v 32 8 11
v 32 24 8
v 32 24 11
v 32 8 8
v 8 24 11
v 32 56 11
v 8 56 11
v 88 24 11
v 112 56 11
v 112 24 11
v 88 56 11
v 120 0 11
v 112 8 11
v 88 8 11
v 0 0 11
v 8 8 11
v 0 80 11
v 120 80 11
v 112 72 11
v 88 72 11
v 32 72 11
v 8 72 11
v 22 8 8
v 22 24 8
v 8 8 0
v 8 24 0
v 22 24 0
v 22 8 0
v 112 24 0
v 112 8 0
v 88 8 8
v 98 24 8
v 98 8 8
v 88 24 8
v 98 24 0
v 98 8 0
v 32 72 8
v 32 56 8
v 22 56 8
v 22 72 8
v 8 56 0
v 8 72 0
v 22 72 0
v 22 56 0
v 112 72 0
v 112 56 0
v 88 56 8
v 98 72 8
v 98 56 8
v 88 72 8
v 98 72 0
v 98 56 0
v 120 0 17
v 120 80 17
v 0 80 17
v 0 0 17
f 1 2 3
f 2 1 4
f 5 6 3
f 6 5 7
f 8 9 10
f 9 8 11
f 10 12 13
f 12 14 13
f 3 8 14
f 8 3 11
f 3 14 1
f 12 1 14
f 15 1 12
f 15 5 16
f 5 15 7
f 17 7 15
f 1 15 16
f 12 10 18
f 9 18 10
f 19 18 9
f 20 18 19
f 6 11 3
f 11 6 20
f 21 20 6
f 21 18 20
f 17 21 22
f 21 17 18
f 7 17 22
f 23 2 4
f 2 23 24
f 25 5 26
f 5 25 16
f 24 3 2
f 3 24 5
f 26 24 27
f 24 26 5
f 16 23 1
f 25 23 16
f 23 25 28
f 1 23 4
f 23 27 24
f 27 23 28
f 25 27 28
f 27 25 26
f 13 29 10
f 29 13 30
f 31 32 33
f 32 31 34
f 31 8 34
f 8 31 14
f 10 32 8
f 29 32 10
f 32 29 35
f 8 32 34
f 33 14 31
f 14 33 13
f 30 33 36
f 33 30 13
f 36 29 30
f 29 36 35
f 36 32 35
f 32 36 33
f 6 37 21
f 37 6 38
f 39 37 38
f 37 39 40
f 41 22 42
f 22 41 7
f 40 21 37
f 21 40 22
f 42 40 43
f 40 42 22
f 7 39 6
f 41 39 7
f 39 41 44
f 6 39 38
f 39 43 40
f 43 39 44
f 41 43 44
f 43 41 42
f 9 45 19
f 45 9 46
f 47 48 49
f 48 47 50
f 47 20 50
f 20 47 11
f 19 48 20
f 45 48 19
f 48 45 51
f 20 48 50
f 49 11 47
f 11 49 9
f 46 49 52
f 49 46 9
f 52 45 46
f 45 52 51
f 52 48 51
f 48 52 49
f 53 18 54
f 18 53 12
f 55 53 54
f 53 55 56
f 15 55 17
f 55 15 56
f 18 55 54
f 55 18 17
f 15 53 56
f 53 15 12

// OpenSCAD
// === Parameters ===

// Main slab dimensions
slab_width  = 120;   // X dimension of slab
slab_depth  = 80;    // Y dimension of slab
slab_height = 6;     // Z thickness of slab

// Shallow underside pad dimensions
pad_width   = 24;    // X dimension of each pad
pad_depth   = 16;    // Y dimension of each pad
pad_height  = 3;     // Z depth (shallow tier)

// Deep continuation dimensions (narrower, taller)
cont_width  = 14;    // X dimension (must be <= pad_width)
cont_height = 8;     // Z depth below the pad (deep tier)

// Pad inset from slab perimeter edges
inset_x = 8;         // distance from slab left/right edges to pad
inset_y = 8;         // distance from slab front/back edges to pad

// Resolution
$fn = 32;

// === Derived positions ===
// Stack order (bottom to top): deep cont -> shallow pad -> slab
// Z origins for each layer
z_cont = 0;
z_pad  = cont_height;
z_slab = cont_height + pad_height;

// Pad X positions (left pair and right pair)
pad_x_left  = inset_x;
pad_x_right = slab_width - inset_x - pad_width;

// Pad Y positions (front pair and back pair)
pad_y_front = inset_y;
pad_y_back  = slab_depth - inset_y - pad_depth;

// === Modules ===

// Two-tier underside protrusion
// align_right: if true, deep part shares right edge with pad;
//              if false, deep part shares left edge with pad.
module underside_protrusion(align_right = false) {
    // Shallow pad (upper tier, directly under slab)
    translate([0, 0, z_pad])
        cube([pad_width, pad_depth, pad_height]);

    // Deep continuation (lower tier)
    // Shares front & back edges (same Y, same pad_depth)
    // Shares left or right X edge depending on align_right
    cont_x_offset = align_right ? (pad_width - cont_width) : 0;
    translate([cont_x_offset, 0, z_cont])
        cube([cont_width, pad_depth, cont_height]);
}

// === Main Assembly ===
union() {
    // Main rectangular slab (top layer)
    translate([0, 0, z_slab])
        cube([slab_width, slab_depth, slab_height]);

    // Front-left pad: deep part aligned to LEFT (outward edge)
    translate([pad_x_left, pad_y_front, 0])
        underside_protrusion(align_right = false);

    // Front-right pad: deep part aligned to RIGHT (outward edge)
    translate([pad_x_right, pad_y_front, 0])
        underside_protrusion(align_right = true);

    // Back-left pad: deep part aligned to LEFT (outward edge)
    translate([pad_x_left, pad_y_back, 0])
        underside_protrusion(align_right = false);

    // Back-right pad: deep part aligned to RIGHT (outward edge)
    translate([pad_x_right, pad_y_back, 0])
        underside_protrusion(align_right = true);
}
